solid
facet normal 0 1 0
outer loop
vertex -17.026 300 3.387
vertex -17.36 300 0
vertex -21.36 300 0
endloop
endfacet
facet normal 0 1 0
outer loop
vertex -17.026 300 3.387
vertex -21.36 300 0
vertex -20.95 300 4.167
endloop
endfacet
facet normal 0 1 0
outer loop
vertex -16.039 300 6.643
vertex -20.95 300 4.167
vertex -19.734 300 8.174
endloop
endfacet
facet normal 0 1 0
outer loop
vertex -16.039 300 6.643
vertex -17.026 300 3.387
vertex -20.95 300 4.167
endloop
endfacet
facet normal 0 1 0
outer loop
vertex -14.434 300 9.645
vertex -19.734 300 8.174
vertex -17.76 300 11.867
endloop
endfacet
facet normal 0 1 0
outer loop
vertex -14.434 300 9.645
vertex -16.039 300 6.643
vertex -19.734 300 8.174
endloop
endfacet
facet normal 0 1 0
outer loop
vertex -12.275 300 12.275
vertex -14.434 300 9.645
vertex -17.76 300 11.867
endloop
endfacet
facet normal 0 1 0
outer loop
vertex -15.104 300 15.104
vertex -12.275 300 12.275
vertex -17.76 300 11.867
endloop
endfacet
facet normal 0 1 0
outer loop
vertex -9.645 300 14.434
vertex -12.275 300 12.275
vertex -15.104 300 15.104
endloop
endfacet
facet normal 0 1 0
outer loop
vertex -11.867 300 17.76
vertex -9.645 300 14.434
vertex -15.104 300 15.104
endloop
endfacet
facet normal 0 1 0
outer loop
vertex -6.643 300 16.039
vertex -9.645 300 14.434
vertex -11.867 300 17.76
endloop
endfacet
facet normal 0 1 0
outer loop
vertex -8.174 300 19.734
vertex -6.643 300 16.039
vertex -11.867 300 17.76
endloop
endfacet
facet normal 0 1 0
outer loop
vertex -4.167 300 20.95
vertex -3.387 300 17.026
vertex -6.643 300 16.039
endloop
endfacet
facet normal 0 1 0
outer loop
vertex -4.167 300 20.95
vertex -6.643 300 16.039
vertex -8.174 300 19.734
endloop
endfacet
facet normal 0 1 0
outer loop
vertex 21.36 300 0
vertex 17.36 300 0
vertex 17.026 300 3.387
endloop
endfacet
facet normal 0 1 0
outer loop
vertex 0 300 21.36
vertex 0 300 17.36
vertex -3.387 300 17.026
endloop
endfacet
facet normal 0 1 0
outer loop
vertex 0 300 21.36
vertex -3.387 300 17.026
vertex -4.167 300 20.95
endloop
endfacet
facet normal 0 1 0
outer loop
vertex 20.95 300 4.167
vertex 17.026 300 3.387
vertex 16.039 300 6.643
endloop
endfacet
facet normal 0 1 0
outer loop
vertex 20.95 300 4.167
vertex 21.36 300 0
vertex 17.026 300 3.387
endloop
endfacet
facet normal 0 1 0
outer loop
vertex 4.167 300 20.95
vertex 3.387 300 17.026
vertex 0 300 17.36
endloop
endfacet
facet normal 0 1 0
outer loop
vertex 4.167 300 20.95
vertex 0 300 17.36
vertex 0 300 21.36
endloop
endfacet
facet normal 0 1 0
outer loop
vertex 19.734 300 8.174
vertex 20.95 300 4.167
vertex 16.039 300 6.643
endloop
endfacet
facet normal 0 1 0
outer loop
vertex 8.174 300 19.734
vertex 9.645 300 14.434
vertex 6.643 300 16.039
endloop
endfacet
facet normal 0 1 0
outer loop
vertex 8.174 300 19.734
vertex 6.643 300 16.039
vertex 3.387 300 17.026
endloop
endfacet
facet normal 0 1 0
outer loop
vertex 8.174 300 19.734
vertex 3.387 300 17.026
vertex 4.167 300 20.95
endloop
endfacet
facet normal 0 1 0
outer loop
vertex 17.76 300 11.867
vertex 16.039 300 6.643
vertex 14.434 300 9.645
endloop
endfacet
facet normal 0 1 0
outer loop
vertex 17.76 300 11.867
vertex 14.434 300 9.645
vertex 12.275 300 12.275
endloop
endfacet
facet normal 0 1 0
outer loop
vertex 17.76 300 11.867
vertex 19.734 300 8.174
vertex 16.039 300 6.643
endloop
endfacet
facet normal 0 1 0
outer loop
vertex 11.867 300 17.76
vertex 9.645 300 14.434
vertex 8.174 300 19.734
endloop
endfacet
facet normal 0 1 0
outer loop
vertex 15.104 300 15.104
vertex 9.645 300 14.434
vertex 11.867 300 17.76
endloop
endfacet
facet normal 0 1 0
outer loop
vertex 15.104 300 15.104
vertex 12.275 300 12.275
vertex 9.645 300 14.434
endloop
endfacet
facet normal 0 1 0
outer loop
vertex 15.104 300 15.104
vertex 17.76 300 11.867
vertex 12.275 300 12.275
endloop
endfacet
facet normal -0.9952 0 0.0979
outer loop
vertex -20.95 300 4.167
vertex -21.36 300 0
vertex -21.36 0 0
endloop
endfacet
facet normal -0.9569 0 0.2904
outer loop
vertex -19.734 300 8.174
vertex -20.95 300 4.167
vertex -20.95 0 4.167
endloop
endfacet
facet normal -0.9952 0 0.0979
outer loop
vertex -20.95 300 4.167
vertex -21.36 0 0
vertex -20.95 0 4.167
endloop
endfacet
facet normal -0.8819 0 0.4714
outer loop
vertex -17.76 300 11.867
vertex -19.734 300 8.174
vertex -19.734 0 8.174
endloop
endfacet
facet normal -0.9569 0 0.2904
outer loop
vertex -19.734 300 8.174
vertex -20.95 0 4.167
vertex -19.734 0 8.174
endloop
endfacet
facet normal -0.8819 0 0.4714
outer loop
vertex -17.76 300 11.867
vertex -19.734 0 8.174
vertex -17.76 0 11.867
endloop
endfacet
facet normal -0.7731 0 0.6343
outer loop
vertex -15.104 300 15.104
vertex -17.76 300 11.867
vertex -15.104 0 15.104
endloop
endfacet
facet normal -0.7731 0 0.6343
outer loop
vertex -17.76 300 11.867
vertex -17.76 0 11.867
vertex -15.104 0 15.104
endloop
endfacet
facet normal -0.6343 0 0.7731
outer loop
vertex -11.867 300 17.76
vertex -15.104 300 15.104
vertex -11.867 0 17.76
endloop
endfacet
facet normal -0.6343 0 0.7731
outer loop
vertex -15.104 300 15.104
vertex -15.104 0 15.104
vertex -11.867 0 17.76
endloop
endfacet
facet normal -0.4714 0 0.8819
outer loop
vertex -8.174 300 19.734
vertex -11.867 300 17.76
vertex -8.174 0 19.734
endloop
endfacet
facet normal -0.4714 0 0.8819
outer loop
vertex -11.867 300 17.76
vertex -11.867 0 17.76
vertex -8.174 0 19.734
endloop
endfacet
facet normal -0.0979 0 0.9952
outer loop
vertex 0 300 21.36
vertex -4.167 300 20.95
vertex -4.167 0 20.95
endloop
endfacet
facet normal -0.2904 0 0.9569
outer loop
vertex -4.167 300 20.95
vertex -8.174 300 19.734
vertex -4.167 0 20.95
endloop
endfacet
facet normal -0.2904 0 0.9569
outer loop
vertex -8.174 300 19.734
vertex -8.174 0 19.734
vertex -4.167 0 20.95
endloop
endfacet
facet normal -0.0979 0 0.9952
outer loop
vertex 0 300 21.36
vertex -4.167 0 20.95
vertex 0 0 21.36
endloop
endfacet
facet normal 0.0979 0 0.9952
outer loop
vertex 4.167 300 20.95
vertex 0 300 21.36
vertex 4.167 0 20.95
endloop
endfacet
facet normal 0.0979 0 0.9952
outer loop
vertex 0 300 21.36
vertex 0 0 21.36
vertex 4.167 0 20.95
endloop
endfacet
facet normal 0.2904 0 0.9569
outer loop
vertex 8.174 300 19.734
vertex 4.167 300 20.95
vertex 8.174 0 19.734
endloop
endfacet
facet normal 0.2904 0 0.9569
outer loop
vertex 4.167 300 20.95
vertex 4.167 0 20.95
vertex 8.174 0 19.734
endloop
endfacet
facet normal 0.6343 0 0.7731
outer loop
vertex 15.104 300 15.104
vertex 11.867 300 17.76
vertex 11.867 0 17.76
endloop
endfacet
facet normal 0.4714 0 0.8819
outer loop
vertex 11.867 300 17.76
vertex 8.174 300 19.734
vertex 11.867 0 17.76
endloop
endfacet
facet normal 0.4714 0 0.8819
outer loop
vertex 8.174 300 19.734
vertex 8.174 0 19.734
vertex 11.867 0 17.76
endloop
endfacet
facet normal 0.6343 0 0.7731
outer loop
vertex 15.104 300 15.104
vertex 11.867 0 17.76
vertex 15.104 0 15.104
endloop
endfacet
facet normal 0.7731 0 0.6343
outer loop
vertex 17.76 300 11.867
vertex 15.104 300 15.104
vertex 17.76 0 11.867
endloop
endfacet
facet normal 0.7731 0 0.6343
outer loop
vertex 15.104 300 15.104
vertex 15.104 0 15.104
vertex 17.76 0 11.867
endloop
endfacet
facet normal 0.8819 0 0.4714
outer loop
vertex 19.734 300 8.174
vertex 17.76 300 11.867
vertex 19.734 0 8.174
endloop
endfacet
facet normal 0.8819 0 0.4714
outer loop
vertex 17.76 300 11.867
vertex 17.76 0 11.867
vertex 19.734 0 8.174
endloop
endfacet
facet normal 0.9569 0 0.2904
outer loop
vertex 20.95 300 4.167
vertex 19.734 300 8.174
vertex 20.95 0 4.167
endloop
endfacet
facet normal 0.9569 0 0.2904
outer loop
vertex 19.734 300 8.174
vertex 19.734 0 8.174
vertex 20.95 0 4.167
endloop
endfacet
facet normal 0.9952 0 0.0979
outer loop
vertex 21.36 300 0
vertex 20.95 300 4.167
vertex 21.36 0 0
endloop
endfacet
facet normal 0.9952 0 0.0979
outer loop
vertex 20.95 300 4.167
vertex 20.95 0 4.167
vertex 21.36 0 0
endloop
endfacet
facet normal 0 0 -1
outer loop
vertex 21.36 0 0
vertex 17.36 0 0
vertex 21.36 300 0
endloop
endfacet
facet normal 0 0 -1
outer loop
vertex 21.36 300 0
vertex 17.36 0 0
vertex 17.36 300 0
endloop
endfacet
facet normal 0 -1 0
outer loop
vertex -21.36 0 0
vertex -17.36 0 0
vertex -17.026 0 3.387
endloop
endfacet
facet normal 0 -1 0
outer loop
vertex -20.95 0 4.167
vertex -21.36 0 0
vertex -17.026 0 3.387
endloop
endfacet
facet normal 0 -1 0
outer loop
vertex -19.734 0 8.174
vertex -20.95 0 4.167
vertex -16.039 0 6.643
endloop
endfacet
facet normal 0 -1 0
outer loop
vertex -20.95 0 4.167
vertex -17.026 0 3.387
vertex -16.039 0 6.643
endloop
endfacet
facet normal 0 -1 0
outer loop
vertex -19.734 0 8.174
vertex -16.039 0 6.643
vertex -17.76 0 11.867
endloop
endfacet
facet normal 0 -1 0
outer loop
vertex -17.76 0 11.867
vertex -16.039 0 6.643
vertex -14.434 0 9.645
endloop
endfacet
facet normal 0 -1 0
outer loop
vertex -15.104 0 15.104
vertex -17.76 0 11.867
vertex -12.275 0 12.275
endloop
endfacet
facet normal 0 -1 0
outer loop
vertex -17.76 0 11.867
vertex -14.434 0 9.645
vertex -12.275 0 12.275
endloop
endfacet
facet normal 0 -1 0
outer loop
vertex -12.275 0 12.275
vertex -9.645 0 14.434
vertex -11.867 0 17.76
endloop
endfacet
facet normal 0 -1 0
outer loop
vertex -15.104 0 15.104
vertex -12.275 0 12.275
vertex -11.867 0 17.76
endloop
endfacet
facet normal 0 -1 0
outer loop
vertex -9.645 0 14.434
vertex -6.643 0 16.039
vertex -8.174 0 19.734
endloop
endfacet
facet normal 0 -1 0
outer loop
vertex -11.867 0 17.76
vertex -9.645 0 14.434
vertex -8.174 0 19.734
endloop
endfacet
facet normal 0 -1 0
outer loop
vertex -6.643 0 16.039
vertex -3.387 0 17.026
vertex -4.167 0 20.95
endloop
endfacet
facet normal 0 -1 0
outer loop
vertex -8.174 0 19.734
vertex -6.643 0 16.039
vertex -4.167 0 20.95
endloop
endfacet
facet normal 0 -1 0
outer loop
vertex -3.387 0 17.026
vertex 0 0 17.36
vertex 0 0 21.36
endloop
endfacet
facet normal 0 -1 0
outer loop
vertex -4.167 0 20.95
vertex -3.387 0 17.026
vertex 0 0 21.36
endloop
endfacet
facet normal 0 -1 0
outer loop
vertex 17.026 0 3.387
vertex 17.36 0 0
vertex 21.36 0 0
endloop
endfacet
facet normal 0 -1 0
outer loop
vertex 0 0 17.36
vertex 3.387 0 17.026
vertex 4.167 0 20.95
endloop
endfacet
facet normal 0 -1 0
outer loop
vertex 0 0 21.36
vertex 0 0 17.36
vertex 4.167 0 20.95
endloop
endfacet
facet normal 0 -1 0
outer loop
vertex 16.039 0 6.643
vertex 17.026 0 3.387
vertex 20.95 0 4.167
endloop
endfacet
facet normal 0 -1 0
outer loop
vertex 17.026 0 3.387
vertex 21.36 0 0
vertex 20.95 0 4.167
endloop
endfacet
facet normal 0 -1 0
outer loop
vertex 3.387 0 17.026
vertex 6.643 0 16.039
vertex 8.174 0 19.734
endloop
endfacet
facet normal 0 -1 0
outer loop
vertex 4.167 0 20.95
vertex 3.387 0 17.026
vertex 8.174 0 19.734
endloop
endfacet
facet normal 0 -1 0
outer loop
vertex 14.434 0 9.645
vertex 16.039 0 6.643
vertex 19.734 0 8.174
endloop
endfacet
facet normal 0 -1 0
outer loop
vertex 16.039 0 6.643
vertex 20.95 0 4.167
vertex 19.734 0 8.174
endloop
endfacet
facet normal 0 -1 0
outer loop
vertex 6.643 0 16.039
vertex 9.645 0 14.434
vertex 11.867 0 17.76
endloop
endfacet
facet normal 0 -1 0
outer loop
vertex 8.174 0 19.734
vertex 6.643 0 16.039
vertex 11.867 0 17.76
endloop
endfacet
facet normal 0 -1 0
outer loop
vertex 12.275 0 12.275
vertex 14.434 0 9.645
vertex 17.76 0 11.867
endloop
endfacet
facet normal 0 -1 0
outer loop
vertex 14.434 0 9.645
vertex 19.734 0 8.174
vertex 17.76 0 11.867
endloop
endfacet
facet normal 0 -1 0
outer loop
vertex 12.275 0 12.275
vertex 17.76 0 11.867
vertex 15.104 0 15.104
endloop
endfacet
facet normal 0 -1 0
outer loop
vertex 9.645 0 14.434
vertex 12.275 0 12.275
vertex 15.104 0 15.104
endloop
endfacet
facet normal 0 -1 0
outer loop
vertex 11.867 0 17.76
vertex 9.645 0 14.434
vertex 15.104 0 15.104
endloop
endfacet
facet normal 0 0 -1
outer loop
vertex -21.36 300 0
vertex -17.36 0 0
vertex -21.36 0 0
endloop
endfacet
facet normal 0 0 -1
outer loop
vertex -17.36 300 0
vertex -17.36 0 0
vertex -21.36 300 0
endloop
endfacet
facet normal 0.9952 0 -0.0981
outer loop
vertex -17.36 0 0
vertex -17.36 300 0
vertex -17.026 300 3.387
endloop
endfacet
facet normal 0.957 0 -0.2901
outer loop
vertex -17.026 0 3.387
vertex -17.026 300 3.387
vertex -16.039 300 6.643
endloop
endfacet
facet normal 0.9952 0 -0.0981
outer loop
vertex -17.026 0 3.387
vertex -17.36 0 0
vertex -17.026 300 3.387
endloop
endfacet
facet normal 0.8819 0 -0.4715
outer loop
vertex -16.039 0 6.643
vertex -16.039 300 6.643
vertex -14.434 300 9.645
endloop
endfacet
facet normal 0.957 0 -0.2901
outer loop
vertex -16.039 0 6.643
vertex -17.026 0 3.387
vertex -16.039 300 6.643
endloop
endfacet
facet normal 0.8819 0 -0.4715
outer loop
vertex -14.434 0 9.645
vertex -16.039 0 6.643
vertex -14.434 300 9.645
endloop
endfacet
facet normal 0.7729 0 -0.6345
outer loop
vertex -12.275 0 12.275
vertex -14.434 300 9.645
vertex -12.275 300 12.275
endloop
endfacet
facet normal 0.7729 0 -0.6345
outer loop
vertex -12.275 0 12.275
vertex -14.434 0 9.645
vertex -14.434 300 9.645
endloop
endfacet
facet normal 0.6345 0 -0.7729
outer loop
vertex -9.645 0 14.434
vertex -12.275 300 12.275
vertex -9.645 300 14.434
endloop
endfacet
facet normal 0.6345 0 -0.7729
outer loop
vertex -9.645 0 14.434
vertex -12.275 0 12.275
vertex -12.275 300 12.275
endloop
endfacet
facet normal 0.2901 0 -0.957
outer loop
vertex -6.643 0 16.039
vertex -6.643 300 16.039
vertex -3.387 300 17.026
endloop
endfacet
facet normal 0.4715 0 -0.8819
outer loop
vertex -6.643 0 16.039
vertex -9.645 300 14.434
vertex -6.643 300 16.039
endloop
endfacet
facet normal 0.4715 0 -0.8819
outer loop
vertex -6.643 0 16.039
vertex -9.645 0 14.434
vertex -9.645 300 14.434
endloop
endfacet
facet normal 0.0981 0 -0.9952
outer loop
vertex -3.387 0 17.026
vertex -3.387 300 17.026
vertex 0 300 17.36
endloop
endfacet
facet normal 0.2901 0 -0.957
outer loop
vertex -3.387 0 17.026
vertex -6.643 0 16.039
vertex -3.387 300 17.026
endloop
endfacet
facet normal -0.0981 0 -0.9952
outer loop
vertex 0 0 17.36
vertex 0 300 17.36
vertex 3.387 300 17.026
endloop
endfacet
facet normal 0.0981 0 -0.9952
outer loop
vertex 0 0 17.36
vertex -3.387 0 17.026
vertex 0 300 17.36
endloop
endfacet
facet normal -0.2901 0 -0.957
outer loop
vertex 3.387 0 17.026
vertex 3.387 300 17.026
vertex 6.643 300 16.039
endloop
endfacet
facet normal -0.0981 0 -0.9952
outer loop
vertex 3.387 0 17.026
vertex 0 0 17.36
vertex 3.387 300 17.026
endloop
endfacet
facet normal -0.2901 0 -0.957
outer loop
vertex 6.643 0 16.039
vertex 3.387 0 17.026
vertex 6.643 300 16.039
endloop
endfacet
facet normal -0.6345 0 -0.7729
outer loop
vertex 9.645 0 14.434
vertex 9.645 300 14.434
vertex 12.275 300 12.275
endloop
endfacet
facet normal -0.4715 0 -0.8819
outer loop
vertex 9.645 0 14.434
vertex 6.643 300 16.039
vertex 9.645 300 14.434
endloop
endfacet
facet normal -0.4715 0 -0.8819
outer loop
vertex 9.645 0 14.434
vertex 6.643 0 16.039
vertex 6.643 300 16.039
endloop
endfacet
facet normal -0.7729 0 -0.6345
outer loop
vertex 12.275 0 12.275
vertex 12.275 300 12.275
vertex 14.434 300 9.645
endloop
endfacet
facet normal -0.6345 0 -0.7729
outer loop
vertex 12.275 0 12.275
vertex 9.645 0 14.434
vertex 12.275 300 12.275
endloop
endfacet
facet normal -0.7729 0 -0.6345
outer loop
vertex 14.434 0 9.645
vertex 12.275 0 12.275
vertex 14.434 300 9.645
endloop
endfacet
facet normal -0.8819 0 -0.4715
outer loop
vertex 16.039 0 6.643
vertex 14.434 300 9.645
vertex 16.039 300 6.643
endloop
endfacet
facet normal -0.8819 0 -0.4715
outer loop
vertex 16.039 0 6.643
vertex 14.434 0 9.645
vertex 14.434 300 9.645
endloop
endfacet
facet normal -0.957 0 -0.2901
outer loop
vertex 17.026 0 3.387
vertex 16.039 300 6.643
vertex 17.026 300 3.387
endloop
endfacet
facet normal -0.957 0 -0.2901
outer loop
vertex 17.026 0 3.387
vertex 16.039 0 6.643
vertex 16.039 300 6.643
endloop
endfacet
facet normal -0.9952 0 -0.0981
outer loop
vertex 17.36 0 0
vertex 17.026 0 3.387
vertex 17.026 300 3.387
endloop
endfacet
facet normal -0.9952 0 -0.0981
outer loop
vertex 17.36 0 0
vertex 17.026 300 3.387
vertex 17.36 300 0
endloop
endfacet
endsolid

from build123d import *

# Parameters (mm, degrees)
SKETCH2_R               = 21.36
BOSS_EXTRUDE1_DEPTH     = 300
SHELL1_T                = -4
SKETCH3_W               = 54.462291246
SKETCH3_H               = 357.024978236
CUT_EXTRUDE1_DEPTH      = 302.516996536
CUT_EXTRUDE1_DEPTH_BACK = 302.516996536


with BuildPart() as part:
    # Sketch2 → Boss-Extrude1 (new body)
    with BuildSketch(Plane(origin=(0, 0, 0), x_dir=(1, 0, 0), z_dir=(0, 1, 0))):
        with Locations(Location((0, 0, 0), (0, 0, 270))):
            Circle(SKETCH2_R)
    extrude(amount=BOSS_EXTRUDE1_DEPTH)

    # Shell1
    shell1_openings = [part.faces().sort_by_distance(p)[0] for p in [
        (0, 300, 0),
        (0, 0, 0),
    ]]
    offset(amount=SHELL1_T, openings=shell1_openings, kind=Kind.INTERSECTION)

    # Sketch3 → Cut-Extrude1 (cut, two sides)
    with BuildSketch(Plane(origin=(0, 0, 0), x_dir=(0, 0, -1), z_dir=(1, 0, 0))) as cut_extrude1_sk:
        with Locations((27.231145623, 138.076503498)):
            Rectangle(SKETCH3_W, SKETCH3_H)
    extrude(amount=CUT_EXTRUDE1_DEPTH, mode=Mode.SUBTRACT)
    extrude(cut_extrude1_sk.sketch, amount=-CUT_EXTRUDE1_DEPTH_BACK, mode=Mode.SUBTRACT)


solid = part.part
